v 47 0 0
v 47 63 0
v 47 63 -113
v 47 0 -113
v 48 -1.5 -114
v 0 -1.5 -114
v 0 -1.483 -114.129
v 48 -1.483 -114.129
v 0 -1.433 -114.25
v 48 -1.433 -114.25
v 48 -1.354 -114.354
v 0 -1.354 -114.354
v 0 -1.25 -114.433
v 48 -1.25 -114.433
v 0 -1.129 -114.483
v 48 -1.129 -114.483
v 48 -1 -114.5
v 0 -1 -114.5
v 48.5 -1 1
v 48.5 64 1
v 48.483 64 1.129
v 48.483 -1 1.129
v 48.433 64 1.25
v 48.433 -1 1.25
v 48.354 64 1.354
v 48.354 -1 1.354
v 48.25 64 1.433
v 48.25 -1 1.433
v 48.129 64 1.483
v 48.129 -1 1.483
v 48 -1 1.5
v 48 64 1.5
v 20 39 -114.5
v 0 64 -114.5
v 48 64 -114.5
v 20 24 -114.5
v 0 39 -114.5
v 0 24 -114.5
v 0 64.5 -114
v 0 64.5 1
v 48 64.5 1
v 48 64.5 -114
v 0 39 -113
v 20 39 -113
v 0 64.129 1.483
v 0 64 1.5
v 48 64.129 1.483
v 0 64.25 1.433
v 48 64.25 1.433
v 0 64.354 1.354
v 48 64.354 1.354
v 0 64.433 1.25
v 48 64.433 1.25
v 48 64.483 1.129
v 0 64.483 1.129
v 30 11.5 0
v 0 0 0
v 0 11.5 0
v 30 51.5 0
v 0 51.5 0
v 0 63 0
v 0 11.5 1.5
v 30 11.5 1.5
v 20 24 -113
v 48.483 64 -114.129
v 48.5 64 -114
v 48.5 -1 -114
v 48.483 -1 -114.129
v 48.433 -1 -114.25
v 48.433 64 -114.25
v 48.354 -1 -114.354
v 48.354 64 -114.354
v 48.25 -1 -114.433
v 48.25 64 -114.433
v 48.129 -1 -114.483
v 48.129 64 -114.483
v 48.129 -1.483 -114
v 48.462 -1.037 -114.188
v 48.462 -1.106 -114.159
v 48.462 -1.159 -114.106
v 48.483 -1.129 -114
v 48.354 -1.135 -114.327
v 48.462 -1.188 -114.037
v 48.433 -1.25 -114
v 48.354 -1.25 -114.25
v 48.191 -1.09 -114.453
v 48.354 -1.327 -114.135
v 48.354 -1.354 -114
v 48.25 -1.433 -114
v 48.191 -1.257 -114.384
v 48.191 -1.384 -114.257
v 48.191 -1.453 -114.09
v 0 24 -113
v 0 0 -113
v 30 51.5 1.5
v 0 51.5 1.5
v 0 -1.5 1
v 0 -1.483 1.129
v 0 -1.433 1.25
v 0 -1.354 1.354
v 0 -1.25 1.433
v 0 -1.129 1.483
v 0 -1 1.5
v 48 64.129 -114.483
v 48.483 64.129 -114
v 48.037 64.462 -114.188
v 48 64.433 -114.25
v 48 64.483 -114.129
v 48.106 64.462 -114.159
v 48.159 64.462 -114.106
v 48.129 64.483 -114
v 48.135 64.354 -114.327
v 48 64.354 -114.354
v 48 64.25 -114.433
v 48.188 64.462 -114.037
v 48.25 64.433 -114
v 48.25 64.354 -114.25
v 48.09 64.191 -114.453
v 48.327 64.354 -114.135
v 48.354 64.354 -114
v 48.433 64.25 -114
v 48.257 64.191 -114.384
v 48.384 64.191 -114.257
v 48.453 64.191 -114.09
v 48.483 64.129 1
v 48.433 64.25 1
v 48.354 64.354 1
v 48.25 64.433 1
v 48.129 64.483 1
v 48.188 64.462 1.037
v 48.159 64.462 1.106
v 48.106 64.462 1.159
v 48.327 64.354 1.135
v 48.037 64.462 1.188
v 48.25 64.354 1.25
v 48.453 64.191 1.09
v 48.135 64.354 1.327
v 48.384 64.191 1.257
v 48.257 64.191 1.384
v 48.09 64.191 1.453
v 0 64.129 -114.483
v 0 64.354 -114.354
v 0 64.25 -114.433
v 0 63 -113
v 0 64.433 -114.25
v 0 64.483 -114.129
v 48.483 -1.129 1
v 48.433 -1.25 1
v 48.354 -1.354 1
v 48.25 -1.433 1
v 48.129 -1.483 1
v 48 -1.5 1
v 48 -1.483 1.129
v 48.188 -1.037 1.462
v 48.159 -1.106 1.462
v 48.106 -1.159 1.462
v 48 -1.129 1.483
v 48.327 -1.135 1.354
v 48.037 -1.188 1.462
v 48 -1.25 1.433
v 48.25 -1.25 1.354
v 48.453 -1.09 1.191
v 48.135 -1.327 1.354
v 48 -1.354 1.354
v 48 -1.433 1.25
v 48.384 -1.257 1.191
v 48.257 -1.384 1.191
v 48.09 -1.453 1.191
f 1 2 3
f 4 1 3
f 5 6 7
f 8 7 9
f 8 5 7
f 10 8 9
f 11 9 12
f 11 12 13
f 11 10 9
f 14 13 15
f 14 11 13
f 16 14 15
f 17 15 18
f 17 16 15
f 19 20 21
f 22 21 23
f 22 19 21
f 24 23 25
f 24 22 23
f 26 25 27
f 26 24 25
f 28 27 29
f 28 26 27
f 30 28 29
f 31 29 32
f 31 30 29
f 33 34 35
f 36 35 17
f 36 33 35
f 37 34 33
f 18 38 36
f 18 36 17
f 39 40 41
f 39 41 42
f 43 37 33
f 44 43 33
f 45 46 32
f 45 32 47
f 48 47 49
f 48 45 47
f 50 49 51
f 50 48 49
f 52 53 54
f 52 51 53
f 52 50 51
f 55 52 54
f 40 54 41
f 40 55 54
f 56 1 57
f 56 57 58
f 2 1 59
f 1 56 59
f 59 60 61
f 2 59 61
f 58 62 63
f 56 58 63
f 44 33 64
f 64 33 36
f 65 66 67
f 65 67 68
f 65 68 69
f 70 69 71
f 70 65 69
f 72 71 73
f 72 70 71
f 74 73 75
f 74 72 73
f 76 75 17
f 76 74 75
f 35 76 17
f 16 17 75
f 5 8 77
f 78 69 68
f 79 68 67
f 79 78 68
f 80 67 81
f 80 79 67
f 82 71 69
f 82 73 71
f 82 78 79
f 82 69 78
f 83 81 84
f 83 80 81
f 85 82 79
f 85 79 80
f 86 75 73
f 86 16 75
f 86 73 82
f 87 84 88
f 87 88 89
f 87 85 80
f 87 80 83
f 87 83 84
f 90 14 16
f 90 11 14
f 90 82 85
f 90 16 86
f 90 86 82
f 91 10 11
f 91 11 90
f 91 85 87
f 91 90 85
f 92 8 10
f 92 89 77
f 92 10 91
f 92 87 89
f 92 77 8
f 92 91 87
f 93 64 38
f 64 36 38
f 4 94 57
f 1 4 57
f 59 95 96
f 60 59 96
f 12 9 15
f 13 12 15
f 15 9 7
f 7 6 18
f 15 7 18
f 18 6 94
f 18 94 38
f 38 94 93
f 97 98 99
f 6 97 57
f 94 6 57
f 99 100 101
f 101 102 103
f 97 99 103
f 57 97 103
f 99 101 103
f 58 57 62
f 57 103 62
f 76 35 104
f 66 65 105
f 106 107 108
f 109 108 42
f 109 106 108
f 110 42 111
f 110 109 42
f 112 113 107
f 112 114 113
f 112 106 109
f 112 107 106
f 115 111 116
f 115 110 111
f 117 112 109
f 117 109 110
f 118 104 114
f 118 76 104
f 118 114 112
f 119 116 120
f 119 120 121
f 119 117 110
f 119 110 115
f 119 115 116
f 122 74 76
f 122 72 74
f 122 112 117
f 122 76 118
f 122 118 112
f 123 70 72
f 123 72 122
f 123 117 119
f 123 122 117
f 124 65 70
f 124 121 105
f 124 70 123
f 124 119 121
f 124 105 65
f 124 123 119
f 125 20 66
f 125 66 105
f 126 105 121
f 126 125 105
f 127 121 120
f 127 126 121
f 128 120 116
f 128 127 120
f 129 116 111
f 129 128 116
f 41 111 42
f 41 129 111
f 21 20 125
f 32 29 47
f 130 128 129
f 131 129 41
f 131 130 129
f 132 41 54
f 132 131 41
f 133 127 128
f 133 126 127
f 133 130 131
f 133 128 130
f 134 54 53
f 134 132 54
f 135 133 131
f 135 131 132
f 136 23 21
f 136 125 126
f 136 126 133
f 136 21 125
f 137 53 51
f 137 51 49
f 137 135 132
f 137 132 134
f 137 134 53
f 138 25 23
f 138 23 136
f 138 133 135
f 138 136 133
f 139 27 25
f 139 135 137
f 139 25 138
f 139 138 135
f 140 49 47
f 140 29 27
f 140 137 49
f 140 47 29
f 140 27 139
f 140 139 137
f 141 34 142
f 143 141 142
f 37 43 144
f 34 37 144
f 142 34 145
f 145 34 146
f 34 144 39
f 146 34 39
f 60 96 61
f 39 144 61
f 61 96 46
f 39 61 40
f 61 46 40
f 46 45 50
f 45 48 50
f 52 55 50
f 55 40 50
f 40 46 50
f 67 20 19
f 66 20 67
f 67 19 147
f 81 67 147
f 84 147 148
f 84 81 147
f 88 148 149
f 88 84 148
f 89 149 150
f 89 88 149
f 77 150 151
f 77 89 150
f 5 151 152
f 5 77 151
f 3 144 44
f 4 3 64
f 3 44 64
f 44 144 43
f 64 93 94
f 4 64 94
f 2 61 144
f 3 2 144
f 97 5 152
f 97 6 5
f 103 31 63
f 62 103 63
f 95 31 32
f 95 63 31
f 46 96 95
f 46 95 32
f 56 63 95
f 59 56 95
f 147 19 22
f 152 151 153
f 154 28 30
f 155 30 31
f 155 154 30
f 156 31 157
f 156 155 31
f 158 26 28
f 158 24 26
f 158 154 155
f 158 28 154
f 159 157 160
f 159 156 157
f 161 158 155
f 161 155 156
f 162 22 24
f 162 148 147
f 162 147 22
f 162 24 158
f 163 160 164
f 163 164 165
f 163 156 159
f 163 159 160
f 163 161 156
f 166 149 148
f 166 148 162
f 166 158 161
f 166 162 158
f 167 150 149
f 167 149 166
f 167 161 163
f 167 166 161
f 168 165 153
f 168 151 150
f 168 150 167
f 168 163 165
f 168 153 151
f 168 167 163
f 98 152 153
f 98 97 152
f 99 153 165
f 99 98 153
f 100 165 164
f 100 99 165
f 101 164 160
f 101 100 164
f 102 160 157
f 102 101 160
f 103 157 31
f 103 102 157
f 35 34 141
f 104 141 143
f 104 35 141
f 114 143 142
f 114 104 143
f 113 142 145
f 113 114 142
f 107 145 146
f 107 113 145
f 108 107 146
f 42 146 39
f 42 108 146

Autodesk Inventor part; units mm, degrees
ref_plane "YZ Plane" through (0, 0, 0) normal (1, 0, 0) x (0, 1, 0)
ref_plane "XZ Plane" through (0, 0, 0) normal (0, 1, 0) x (-1, 0, 0)
ref_plane "XY Plane" through (0, 0, 0) normal (0, 0, 1) x (1, 0, 0)
sketch "Sketch1" plane through (0, 0, 0) normal (1, 0, 0) x (0, 1, 0)
  line L0 (0, 0) -> (63, 0)
  line L1 (63, 0) -> (63, -113)
  line L2 (63, -113) -> (0, -113)
  line L3 (0, -113) -> (0, 0)
  line L4 (0, 0) -> (-1.5, 0)
  line L5 (-1.5, 0) -> (-1.5, 1.5)
  line L6 (-1.5, 1.5) -> (64.5, 1.5)
  line L7 (64.5, 1.5) -> (64.5, -114.5)
  line L8 (64.5, -114.5) -> (-1.5, -114.5)
  line L9 (-1.5, -114.5) -> (-1.5, 1.5)
  dimension "d0" = 63
  dimension "d1" = 113
  dimension "d2" = 1.5
  dimension "d3" = 1.5
  dimension "d4" = 66
  dimension "d5" = 116
extrude "Extrusion1" add sketch "Sketch1" along normal blind 47
sketch "Sketch2" plane through (47, 0, 0) normal (1, 0, 0) x (0, 0, -1)
  line L0 (114.5, -1.5) -> (114.5, 64.5) projected
  line L1 (114.5, 64.5) -> (-1.5, 64.5) projected
  line L2 (-1.5, 64.5) -> (-1.5, -1.5) projected
  line L3 (-1.5, -1.5) -> (114.5, -1.5) projected
  line L4 (0, 0) -> (0, 63) projected
  line L5 (0, 63) -> (113, 63) projected
  line L6 (113, 63) -> (113, 0) projected
  line L7 (113, 0) -> (0, 0) projected
extrude "Extrusion2" add sketch "Sketch2" along normal blind 1.5 contours L3 L2 L1 L0 | L4 L5 L6 L7
sketch "Sketch3" plane through (0, -1.5, 1.5) normal (0, 0, 1) x (1, 0, 0)
  line L0 (0, 66) -> (0, 0) projected
  line L1 (0, 0) -> (48.5, 0) projected
  line L2 (48.5, 66) -> (48.5, 0) projected
  line L3 (0, 66) -> (48.5, 66) projected
  line L4 (0, 0) -> (0, 66) projected
  line L5 (0, 66) -> (0, 33)
  line L6 (0, 33) -> (0, 13)
  line L7 (0, 13) -> (30, 13)
  line L8 (30, 13) -> (30, 53)
  line L9 (30, 53) -> (0, 53)
  point P0 (0, 1.5)
  dimension "d10" = 33
  dimension "d11" = 20
  dimension "d12" = 30
  dimension "d13" = 90
  dimension "d14" = 40
extrude "Extrusion3" cut sketch "Sketch3" against normal blind 1.5 contours L9 L8 L7 L0
sketch "Sketch4" plane through (0, -1.5, -114.5) normal (0, 0, -1) x (-1, 0, 0)
  line L0 (0, 0) -> (0, 66) projected
  line L1 (0, 66) -> (-48.5, 66) projected
  line L2 (-48.5, 0) -> (-48.5, 66) projected
  line L3 (0, 0) -> (-48.5, 0) projected
  line L4 (0, 0) -> (-48.5, 0) projected
  line L5 (0, 0) -> (0, 33)
  line L6 (0, 33) -> (0, 40.5)
  line L7 (0, 40.5) -> (-20, 40.5)
  line L8 (-20, 40.5) -> (-20, 25.5)
  line L9 (-20, 25.5) -> (0, 25.5)
  line L10 (0, 64.5) -> (0, 1.5) projected
  line L11 (0, 33) -> (0, 25.5)
  dimension "d17" = 33
  dimension "d18" = 7.5
  dimension "d19" = 20
  dimension "d20" = 15
extrude "Extrusion4" cut sketch "Sketch4" against normal blind 1.5 contours L9 L8 L7 L0
fillet "Fillet1" radius 0.5 8 edges at (24.25, -1.5, -114.5) (48.5, 31.5, -114.5) (48.5, -1.5, -56.5) (48.5, 31.5, 1.5) (24.25, -1.5, 1.5) (24.25, 64.5, -114.5) (48.5, 64.5, -56.5) (24.25, 64.5, 1.5)
properties part number "carcasa_exterior"
